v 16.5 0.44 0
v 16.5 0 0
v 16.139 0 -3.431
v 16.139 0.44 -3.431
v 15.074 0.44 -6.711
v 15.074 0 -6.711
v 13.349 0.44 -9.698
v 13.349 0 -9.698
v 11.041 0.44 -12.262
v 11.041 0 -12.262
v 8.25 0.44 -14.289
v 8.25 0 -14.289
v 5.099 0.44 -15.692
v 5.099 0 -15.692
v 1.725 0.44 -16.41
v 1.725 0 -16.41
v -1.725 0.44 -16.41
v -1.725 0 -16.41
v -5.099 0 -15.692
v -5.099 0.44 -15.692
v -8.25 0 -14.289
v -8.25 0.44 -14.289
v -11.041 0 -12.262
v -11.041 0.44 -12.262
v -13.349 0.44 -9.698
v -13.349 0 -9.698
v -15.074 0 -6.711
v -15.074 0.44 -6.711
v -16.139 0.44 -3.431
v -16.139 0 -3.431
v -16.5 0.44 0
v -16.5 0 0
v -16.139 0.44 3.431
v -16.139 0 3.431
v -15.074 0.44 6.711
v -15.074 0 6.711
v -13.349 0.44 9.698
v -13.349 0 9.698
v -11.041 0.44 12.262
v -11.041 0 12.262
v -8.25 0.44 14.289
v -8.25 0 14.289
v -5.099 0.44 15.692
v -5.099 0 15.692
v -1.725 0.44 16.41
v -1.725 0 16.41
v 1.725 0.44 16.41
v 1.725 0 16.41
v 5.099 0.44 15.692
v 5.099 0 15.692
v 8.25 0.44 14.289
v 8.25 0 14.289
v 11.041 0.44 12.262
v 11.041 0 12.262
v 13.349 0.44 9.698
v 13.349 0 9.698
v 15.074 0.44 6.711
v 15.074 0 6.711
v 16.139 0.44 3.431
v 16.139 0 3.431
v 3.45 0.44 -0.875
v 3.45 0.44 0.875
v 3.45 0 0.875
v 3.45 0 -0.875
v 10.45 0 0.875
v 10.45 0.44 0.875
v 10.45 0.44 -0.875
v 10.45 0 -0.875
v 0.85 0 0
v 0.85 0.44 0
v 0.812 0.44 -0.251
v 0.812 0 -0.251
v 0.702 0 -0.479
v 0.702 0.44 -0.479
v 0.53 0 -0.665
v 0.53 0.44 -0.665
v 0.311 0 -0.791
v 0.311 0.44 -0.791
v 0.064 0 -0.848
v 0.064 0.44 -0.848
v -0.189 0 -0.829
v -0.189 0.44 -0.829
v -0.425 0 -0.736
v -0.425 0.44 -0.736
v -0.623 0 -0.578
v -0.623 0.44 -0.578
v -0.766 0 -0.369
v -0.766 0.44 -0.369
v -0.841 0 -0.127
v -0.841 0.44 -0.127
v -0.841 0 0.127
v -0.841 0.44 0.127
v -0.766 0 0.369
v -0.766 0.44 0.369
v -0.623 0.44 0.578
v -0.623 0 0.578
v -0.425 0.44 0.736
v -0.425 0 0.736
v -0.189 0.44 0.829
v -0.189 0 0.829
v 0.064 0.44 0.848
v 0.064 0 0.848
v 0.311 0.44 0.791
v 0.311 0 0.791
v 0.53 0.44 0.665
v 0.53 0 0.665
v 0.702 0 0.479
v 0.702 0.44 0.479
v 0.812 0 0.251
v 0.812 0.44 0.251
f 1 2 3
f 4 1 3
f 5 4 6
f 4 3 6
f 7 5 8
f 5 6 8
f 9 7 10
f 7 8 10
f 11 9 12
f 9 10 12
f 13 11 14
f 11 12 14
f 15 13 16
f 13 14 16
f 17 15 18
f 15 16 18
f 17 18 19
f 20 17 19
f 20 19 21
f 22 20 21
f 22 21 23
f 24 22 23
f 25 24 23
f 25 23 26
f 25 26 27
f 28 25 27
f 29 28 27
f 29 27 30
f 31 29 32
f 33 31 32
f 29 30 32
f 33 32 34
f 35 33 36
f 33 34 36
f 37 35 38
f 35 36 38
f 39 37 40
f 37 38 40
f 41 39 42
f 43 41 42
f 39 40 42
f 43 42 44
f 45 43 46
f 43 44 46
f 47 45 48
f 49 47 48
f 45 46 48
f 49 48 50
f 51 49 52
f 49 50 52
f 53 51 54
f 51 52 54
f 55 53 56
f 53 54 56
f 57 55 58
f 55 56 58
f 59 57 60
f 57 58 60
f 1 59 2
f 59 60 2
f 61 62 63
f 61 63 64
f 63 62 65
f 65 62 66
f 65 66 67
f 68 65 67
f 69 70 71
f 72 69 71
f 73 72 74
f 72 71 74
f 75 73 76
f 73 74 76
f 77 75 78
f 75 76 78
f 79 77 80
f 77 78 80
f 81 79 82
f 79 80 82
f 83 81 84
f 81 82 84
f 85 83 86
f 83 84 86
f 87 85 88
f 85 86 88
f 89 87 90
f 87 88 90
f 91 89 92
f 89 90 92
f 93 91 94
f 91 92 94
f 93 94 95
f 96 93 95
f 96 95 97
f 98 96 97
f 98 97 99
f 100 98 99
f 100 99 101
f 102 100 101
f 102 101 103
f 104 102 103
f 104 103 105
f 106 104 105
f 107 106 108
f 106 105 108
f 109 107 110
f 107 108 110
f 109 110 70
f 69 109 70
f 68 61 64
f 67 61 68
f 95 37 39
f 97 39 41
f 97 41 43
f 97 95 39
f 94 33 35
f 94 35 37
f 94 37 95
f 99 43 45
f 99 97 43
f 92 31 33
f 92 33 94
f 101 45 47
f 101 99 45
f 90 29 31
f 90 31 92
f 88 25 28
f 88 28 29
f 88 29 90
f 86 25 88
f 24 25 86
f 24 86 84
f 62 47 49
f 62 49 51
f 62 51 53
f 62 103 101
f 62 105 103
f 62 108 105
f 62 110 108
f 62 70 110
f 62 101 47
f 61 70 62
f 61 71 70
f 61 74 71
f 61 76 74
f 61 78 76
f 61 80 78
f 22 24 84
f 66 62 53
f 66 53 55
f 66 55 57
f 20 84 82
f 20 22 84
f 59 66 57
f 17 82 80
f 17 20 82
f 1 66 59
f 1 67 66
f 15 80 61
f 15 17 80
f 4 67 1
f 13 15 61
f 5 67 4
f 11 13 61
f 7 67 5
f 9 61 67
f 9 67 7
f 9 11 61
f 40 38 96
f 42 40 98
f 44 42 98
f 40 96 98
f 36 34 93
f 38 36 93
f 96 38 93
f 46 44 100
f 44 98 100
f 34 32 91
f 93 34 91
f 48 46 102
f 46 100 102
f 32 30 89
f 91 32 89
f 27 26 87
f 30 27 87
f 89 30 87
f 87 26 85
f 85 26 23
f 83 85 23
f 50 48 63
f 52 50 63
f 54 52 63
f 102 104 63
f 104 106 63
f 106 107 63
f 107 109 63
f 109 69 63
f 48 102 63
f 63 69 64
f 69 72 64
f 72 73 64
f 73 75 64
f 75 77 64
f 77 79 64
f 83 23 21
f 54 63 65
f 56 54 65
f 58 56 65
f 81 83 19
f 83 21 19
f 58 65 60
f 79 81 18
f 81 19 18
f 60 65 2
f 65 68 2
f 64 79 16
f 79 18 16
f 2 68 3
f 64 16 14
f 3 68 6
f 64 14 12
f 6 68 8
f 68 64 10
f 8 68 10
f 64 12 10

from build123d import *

# Parameters (mm, degrees)
SKETCH1_R           = 16.5
BOSS_EXTRUDE1_DEPTH = 0.44
SKETCH2_R           = 0.85
SKETCH2_W           = 7
SKETCH2_H           = 1.75
CUT_EXTRUDE1_DEPTH  = 0.44


with BuildPart() as part:
    # Sketch1 → Boss-Extrude1 (new body)
    with BuildSketch(Plane(origin=(0, 0, 0), x_dir=(1, 0, 0), z_dir=(0, 1, 0))):
        Circle(SKETCH1_R)
    extrude(amount=BOSS_EXTRUDE1_DEPTH)

    # Sketch2 → Cut-Extrude1 (cut)
    with BuildSketch(Plane(origin=(0, 0.44, 0), x_dir=(1, 0, 0), z_dir=(0, 1, 0))):
        Circle(SKETCH2_R)
        with Locations((6.95, 0)):
            Rectangle(SKETCH2_W, SKETCH2_H)
    extrude(amount=-CUT_EXTRUDE1_DEPTH, mode=Mode.SUBTRACT)


solid = part.part
